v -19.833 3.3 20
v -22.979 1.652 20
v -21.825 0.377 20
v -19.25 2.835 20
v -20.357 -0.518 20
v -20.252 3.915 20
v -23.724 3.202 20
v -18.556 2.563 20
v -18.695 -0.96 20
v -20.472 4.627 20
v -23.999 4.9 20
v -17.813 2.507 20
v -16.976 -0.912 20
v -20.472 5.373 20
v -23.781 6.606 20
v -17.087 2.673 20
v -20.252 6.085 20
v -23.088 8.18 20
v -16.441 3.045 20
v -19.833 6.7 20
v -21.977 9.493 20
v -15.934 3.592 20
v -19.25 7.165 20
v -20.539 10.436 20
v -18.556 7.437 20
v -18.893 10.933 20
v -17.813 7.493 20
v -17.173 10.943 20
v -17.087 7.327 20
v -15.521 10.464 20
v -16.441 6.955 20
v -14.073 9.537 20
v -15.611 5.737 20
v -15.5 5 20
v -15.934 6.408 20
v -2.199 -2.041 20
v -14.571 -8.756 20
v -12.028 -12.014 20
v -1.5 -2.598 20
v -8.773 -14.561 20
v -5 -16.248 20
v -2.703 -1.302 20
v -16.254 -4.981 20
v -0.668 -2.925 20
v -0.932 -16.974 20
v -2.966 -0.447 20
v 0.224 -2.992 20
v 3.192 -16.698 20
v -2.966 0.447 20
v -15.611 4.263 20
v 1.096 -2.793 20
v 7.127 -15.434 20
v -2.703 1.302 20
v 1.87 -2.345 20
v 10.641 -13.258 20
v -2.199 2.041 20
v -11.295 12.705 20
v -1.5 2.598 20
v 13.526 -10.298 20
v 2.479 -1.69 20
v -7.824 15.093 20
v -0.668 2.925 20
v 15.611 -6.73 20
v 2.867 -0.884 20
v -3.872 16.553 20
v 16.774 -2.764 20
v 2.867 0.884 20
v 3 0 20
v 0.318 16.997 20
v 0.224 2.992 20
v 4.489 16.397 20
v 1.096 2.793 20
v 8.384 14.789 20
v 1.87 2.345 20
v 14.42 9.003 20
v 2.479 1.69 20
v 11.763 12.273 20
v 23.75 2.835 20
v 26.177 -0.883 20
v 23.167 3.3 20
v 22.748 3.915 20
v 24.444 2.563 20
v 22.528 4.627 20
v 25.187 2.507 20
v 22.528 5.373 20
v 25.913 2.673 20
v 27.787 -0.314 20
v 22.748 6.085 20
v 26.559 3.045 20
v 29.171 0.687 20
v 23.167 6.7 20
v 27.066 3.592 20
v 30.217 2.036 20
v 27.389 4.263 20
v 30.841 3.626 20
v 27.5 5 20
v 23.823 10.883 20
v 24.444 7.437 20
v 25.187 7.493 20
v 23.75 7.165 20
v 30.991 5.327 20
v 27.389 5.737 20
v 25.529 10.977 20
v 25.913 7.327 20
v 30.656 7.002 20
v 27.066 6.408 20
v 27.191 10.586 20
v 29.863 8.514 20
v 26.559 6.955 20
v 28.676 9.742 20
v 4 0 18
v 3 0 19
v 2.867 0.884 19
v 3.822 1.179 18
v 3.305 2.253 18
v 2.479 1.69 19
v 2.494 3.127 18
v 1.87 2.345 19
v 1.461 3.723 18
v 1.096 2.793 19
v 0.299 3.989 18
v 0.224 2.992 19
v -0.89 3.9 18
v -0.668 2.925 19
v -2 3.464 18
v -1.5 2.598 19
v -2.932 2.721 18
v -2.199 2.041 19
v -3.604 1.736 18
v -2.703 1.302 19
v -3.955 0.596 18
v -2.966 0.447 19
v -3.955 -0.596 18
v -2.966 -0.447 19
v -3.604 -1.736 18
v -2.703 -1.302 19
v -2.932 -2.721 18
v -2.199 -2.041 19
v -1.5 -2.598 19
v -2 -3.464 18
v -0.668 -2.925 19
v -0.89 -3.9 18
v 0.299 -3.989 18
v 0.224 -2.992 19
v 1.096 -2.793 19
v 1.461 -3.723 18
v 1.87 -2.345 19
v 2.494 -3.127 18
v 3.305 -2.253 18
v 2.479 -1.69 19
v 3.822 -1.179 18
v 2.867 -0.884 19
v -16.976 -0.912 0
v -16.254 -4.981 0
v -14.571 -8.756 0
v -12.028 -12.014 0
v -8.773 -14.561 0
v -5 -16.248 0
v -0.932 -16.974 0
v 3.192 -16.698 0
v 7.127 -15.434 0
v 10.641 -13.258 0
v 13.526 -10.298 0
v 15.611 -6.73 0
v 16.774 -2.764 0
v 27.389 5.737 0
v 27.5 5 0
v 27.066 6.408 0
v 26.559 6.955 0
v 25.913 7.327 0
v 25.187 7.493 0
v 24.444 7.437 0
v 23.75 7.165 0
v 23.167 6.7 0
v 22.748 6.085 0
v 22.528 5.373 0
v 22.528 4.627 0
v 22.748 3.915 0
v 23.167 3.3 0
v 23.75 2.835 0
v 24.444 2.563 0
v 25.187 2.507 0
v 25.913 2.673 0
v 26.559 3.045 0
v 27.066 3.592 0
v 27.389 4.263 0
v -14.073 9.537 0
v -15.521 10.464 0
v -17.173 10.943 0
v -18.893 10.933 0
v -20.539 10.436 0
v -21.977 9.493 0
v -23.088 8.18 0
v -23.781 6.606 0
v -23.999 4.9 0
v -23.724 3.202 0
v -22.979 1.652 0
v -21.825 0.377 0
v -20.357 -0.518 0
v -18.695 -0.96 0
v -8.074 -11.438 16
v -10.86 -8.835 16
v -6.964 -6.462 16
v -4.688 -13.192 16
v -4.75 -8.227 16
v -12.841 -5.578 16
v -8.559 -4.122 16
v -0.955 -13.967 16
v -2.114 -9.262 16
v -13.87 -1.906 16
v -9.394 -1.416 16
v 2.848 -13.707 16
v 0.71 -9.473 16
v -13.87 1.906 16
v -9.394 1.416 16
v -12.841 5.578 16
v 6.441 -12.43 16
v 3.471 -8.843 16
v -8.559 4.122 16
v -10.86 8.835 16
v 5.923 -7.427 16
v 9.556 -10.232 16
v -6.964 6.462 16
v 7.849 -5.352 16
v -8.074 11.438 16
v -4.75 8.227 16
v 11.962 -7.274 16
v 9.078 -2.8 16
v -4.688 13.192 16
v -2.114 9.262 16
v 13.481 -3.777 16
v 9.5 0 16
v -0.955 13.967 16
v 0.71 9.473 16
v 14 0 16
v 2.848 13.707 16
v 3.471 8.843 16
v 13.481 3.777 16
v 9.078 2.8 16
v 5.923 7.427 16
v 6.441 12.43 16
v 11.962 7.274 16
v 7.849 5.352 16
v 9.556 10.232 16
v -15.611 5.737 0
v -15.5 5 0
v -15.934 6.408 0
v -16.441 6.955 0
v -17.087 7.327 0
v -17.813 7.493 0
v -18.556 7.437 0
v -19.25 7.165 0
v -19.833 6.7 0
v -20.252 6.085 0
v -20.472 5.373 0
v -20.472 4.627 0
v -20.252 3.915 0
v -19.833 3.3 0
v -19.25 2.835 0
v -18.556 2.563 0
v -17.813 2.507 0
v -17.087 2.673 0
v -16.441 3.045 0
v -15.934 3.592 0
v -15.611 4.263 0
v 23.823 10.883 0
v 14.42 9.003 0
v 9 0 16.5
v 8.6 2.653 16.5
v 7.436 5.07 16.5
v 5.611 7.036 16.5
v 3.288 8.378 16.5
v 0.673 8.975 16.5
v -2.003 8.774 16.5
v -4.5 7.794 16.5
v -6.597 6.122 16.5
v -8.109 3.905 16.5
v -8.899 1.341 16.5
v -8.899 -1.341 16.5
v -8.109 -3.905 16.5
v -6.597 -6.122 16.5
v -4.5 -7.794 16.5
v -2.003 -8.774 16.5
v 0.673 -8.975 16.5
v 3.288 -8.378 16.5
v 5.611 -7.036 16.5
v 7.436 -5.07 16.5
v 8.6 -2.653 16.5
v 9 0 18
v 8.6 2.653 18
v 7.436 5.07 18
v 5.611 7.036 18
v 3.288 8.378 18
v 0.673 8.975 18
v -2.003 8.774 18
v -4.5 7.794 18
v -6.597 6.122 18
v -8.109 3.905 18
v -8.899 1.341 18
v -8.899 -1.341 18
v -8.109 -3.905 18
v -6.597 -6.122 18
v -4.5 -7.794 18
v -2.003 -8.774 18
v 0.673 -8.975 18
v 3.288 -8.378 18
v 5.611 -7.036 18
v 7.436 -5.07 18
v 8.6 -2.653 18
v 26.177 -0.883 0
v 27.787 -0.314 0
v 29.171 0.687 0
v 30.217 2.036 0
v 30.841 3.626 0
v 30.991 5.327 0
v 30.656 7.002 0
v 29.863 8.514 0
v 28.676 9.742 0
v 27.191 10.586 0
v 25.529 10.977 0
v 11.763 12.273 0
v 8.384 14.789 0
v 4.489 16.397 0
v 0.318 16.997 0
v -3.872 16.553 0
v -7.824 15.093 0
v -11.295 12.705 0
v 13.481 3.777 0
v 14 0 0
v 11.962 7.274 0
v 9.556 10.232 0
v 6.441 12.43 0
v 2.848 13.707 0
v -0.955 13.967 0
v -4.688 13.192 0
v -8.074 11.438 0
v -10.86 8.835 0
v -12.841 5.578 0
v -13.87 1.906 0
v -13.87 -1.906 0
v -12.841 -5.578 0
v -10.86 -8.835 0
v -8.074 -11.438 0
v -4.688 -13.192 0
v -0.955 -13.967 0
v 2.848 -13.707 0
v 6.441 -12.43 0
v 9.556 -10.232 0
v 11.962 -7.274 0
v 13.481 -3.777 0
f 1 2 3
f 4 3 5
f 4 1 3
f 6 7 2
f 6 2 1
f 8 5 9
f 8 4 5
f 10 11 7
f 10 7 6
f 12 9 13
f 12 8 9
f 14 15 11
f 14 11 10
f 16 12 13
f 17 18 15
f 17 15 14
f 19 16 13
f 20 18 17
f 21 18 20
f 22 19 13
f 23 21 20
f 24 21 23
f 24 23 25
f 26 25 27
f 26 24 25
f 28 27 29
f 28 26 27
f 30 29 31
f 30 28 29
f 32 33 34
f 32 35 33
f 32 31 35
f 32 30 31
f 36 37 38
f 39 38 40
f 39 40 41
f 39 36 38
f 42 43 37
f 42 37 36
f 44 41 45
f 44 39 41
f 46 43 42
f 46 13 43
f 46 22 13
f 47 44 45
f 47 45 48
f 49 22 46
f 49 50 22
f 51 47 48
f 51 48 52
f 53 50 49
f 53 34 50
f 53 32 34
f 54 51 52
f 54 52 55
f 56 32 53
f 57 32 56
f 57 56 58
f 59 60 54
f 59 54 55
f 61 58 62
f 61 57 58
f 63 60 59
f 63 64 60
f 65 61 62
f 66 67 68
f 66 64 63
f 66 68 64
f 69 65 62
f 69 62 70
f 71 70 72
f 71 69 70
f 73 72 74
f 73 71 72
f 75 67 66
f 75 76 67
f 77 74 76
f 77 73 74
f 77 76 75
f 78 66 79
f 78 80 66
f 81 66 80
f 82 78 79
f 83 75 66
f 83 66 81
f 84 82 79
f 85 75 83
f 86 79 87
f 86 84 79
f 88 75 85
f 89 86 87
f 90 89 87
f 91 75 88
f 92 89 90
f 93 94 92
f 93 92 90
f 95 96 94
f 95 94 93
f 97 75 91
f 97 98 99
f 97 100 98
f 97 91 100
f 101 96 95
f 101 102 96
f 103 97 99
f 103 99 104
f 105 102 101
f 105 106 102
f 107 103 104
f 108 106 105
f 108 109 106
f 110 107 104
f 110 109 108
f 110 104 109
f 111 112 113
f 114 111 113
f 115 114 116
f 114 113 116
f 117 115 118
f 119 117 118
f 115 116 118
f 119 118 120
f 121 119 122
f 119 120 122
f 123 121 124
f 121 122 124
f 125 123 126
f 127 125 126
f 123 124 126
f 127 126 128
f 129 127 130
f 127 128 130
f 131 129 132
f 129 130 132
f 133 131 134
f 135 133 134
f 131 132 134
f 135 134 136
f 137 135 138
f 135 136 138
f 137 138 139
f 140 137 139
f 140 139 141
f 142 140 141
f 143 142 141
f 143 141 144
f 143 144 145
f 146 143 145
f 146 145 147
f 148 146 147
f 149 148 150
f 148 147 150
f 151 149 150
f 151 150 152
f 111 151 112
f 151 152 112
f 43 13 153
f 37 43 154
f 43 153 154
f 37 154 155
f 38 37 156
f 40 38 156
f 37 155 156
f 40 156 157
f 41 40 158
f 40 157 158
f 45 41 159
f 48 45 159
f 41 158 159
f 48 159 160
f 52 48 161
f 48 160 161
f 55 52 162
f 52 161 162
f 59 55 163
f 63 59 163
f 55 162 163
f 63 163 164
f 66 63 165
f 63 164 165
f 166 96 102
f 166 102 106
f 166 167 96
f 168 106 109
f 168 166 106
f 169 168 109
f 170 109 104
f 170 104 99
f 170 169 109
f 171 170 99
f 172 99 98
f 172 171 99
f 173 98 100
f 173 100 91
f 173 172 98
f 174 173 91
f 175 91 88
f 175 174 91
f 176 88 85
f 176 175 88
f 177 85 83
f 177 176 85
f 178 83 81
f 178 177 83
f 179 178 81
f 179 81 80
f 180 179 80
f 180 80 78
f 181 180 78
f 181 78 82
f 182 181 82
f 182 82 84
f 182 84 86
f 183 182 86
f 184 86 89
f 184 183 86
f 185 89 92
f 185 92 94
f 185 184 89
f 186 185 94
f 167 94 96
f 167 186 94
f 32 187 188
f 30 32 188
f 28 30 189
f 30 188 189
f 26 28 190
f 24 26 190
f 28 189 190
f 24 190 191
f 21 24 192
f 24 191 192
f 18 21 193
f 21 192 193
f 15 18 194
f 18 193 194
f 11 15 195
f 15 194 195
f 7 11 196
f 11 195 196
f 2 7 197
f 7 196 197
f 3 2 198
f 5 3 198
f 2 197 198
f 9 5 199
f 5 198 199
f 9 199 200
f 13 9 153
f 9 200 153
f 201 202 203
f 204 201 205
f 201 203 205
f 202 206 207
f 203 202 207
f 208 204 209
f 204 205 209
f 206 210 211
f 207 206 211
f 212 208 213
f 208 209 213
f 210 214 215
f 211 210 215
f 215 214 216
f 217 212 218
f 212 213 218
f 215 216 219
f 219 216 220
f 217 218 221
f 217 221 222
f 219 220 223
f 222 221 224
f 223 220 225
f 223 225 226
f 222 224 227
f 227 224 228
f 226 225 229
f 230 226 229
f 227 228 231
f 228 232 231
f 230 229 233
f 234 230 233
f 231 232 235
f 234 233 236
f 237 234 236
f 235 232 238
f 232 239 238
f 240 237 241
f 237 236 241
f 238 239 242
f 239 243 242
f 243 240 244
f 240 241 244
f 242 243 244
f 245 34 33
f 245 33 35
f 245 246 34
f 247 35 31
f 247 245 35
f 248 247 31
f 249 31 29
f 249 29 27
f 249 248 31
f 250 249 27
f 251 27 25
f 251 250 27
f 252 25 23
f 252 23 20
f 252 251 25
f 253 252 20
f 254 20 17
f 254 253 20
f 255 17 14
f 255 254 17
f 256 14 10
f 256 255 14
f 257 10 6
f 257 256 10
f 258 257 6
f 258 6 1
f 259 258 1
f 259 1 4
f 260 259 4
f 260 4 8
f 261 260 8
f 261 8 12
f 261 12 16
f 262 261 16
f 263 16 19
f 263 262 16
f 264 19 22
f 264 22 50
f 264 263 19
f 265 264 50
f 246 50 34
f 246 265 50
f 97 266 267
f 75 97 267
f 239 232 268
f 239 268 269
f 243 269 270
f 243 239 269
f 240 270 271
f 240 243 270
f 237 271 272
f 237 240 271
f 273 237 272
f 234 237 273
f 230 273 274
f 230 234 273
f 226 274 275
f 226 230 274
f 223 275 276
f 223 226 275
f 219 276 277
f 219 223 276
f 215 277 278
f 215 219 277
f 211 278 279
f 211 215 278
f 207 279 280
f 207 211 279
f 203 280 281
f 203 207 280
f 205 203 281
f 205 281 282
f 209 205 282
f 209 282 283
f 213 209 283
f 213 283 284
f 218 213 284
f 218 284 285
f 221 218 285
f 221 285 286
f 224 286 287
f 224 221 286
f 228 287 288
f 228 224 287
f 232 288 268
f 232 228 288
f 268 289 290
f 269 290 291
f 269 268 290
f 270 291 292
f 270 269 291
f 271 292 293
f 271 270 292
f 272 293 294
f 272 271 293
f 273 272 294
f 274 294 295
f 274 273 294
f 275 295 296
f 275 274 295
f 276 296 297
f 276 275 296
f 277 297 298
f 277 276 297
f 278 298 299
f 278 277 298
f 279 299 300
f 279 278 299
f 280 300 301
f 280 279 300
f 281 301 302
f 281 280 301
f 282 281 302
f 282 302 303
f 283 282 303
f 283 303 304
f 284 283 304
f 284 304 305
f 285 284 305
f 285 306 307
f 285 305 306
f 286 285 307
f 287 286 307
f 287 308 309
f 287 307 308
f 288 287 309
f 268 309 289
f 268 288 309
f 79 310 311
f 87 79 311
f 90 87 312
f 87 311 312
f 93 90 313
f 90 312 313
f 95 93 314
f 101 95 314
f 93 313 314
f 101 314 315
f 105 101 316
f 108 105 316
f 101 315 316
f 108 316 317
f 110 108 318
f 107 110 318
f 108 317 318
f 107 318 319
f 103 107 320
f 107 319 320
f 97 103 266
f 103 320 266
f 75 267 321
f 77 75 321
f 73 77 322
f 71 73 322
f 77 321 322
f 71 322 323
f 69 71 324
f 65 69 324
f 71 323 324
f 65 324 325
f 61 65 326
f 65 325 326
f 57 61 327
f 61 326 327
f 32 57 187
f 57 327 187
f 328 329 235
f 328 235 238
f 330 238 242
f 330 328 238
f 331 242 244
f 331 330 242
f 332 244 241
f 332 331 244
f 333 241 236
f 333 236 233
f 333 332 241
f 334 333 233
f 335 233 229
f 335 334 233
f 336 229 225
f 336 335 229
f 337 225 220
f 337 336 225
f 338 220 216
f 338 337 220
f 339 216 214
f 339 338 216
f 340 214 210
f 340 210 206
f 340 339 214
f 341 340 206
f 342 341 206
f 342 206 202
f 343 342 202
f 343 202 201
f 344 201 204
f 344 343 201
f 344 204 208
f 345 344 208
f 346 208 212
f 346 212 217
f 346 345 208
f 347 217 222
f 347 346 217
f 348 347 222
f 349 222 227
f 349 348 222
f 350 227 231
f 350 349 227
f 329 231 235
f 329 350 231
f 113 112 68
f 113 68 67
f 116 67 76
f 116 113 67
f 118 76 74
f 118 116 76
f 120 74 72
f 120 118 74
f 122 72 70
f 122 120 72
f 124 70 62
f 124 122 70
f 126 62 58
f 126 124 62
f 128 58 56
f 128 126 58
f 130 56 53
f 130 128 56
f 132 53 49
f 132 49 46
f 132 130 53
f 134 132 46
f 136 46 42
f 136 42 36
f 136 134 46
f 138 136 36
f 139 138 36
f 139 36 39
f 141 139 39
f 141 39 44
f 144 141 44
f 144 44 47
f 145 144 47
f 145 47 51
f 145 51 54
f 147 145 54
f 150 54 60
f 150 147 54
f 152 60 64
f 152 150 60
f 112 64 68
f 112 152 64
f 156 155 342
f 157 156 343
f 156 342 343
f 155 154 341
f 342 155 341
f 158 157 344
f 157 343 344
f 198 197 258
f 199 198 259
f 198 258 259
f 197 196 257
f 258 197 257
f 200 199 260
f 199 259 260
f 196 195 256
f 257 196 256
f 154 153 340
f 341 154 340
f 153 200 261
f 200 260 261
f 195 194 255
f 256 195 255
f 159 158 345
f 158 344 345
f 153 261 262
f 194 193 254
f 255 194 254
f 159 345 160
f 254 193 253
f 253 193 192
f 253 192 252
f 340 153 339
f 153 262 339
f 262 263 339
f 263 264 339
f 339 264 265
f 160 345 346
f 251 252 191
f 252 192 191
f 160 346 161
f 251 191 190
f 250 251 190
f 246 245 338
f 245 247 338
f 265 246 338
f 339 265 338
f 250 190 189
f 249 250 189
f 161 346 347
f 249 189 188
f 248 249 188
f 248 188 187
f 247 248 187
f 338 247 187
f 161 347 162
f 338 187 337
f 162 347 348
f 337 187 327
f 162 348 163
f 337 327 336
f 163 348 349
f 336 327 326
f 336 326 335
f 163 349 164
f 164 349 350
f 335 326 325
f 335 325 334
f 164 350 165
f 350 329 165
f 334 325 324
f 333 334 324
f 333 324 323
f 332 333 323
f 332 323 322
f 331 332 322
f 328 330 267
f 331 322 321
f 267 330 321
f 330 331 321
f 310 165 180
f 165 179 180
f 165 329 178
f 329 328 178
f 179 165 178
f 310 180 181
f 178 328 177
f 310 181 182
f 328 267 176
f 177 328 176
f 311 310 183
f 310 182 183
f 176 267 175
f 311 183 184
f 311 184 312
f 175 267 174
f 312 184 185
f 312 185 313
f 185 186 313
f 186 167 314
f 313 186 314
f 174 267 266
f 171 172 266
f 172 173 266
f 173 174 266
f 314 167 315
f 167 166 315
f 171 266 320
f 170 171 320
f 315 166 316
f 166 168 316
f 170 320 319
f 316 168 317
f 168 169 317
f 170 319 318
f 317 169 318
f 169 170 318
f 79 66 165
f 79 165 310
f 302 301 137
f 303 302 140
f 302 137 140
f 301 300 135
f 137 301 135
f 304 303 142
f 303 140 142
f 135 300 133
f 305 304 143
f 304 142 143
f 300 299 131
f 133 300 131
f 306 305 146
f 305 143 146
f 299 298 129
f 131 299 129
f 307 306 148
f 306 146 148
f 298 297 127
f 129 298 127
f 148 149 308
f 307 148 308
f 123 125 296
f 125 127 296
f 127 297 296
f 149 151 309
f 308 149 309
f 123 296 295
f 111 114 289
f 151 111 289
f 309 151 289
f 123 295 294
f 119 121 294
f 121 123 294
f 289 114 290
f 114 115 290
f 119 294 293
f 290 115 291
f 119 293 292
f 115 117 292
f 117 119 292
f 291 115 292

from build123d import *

# Parameters (mm, degrees)
SKETCH_R        = 14
SKETCH_R_2      = 2.5
PAD_DEPTH       = 16
SKETCH001_R     = 9
SKETCH001_R_2   = 2.5
PAD001_DEPTH    = 2.5
SKETCH002_R     = 3
SKETCH002_R_2   = 2.5
PAD002_DEPTH    = 2
CHAMFER_SIZE    = 0.5
CHAMFER001_SIZE = 1


with BuildPart() as part:
    # Sketch → Pad (new body)
    with BuildSketch(Plane.XY):
        with BuildLine():
            ThreePointArc((-14.073185, 9.536533), (-23.781107, 6.605863), (-16.975525, -0.911891))
            ThreePointArc((-16.975525, -0.911891), (-0.931565, -16.974457), (16.773787, -2.764066))
            Line((16.773787, -2.764066), (26.176697, -0.883484))
            ThreePointArc((26.176697, -0.883484), (30.883484, 6.176697), (23.823303, 10.883484))
            Line((23.823303, 10.883484), (14.420394, 9.002902))
            ThreePointArc((14.420394, 9.002902), (0.318322, 16.997019), (-14.073185, 9.536533))
        make_face()
        Circle(SKETCH_R, mode=Mode.SUBTRACT)
        with Locations((25, 5)):
            Circle(SKETCH_R_2, mode=Mode.SUBTRACT)
        with Locations((-18, 5)):
            Circle(SKETCH_R_2, mode=Mode.SUBTRACT)
    extrude(amount=PAD_DEPTH)

    # Sketch001 → Pad001 (join)
    with BuildSketch(Plane.XY.offset(16)):
        with BuildLine():
            ThreePointArc((-14.073185, 9.536533), (-23.781107, 6.605863), (-16.975525, -0.911891))
            ThreePointArc((-16.975525, -0.911891), (-0.931565, -16.974457), (16.773787, -2.764066))
            Line((16.773787, -2.764066), (26.176697, -0.883484))
            ThreePointArc((26.176697, -0.883484), (30.883484, 6.176697), (23.823303, 10.883484))
            Line((23.823303, 10.883484), (14.420394, 9.002902))
            ThreePointArc((14.420394, 9.002902), (0.318322, 16.997019), (-14.073185, 9.536533))
        make_face()
        Circle(SKETCH001_R, mode=Mode.SUBTRACT)
        with Locations((25, 5)):
            Circle(SKETCH001_R_2, mode=Mode.SUBTRACT)
        with Locations((-18, 5)):
            Circle(SKETCH001_R_2, mode=Mode.SUBTRACT)
    extrude(amount=PAD001_DEPTH)

    # Sketch002 → Pad002 (join)
    with BuildSketch(Plane.XY.offset(18)):
        with BuildLine():
            ThreePointArc((-14.073185, 9.536533), (-23.781107, 6.605863), (-16.975525, -0.911891))
            ThreePointArc((-16.975525, -0.911891), (-0.931565, -16.974457), (16.773787, -2.764066))
            Line((16.773787, -2.764066), (26.176697, -0.883484))
            ThreePointArc((26.176697, -0.883484), (30.883484, 6.176697), (23.823303, 10.883484))
            Line((23.823303, 10.883484), (14.420394, 9.002902))
            ThreePointArc((14.420394, 9.002902), (0.318322, 16.997019), (-14.073185, 9.536533))
        make_face()
        Circle(SKETCH002_R, mode=Mode.SUBTRACT)
        with Locations((25, 5)):
            Circle(SKETCH002_R_2, mode=Mode.SUBTRACT)
        with Locations((-18, 5)):
            Circle(SKETCH002_R_2, mode=Mode.SUBTRACT)
    extrude(amount=PAD002_DEPTH)

    # Chamfer
    chamfer_edges = [part.edges().sort_by_distance(p)[0] for p in [
        (-9, 0, 16),
    ]]
    chamfer(chamfer_edges, length=CHAMFER_SIZE)

    # Chamfer001
    chamfer001_edges = [part.edges().sort_by_distance(p)[0] for p in [
        (-3, 0, 18),
    ]]
    chamfer(chamfer001_edges, length=CHAMFER001_SIZE)


solid = part.part
